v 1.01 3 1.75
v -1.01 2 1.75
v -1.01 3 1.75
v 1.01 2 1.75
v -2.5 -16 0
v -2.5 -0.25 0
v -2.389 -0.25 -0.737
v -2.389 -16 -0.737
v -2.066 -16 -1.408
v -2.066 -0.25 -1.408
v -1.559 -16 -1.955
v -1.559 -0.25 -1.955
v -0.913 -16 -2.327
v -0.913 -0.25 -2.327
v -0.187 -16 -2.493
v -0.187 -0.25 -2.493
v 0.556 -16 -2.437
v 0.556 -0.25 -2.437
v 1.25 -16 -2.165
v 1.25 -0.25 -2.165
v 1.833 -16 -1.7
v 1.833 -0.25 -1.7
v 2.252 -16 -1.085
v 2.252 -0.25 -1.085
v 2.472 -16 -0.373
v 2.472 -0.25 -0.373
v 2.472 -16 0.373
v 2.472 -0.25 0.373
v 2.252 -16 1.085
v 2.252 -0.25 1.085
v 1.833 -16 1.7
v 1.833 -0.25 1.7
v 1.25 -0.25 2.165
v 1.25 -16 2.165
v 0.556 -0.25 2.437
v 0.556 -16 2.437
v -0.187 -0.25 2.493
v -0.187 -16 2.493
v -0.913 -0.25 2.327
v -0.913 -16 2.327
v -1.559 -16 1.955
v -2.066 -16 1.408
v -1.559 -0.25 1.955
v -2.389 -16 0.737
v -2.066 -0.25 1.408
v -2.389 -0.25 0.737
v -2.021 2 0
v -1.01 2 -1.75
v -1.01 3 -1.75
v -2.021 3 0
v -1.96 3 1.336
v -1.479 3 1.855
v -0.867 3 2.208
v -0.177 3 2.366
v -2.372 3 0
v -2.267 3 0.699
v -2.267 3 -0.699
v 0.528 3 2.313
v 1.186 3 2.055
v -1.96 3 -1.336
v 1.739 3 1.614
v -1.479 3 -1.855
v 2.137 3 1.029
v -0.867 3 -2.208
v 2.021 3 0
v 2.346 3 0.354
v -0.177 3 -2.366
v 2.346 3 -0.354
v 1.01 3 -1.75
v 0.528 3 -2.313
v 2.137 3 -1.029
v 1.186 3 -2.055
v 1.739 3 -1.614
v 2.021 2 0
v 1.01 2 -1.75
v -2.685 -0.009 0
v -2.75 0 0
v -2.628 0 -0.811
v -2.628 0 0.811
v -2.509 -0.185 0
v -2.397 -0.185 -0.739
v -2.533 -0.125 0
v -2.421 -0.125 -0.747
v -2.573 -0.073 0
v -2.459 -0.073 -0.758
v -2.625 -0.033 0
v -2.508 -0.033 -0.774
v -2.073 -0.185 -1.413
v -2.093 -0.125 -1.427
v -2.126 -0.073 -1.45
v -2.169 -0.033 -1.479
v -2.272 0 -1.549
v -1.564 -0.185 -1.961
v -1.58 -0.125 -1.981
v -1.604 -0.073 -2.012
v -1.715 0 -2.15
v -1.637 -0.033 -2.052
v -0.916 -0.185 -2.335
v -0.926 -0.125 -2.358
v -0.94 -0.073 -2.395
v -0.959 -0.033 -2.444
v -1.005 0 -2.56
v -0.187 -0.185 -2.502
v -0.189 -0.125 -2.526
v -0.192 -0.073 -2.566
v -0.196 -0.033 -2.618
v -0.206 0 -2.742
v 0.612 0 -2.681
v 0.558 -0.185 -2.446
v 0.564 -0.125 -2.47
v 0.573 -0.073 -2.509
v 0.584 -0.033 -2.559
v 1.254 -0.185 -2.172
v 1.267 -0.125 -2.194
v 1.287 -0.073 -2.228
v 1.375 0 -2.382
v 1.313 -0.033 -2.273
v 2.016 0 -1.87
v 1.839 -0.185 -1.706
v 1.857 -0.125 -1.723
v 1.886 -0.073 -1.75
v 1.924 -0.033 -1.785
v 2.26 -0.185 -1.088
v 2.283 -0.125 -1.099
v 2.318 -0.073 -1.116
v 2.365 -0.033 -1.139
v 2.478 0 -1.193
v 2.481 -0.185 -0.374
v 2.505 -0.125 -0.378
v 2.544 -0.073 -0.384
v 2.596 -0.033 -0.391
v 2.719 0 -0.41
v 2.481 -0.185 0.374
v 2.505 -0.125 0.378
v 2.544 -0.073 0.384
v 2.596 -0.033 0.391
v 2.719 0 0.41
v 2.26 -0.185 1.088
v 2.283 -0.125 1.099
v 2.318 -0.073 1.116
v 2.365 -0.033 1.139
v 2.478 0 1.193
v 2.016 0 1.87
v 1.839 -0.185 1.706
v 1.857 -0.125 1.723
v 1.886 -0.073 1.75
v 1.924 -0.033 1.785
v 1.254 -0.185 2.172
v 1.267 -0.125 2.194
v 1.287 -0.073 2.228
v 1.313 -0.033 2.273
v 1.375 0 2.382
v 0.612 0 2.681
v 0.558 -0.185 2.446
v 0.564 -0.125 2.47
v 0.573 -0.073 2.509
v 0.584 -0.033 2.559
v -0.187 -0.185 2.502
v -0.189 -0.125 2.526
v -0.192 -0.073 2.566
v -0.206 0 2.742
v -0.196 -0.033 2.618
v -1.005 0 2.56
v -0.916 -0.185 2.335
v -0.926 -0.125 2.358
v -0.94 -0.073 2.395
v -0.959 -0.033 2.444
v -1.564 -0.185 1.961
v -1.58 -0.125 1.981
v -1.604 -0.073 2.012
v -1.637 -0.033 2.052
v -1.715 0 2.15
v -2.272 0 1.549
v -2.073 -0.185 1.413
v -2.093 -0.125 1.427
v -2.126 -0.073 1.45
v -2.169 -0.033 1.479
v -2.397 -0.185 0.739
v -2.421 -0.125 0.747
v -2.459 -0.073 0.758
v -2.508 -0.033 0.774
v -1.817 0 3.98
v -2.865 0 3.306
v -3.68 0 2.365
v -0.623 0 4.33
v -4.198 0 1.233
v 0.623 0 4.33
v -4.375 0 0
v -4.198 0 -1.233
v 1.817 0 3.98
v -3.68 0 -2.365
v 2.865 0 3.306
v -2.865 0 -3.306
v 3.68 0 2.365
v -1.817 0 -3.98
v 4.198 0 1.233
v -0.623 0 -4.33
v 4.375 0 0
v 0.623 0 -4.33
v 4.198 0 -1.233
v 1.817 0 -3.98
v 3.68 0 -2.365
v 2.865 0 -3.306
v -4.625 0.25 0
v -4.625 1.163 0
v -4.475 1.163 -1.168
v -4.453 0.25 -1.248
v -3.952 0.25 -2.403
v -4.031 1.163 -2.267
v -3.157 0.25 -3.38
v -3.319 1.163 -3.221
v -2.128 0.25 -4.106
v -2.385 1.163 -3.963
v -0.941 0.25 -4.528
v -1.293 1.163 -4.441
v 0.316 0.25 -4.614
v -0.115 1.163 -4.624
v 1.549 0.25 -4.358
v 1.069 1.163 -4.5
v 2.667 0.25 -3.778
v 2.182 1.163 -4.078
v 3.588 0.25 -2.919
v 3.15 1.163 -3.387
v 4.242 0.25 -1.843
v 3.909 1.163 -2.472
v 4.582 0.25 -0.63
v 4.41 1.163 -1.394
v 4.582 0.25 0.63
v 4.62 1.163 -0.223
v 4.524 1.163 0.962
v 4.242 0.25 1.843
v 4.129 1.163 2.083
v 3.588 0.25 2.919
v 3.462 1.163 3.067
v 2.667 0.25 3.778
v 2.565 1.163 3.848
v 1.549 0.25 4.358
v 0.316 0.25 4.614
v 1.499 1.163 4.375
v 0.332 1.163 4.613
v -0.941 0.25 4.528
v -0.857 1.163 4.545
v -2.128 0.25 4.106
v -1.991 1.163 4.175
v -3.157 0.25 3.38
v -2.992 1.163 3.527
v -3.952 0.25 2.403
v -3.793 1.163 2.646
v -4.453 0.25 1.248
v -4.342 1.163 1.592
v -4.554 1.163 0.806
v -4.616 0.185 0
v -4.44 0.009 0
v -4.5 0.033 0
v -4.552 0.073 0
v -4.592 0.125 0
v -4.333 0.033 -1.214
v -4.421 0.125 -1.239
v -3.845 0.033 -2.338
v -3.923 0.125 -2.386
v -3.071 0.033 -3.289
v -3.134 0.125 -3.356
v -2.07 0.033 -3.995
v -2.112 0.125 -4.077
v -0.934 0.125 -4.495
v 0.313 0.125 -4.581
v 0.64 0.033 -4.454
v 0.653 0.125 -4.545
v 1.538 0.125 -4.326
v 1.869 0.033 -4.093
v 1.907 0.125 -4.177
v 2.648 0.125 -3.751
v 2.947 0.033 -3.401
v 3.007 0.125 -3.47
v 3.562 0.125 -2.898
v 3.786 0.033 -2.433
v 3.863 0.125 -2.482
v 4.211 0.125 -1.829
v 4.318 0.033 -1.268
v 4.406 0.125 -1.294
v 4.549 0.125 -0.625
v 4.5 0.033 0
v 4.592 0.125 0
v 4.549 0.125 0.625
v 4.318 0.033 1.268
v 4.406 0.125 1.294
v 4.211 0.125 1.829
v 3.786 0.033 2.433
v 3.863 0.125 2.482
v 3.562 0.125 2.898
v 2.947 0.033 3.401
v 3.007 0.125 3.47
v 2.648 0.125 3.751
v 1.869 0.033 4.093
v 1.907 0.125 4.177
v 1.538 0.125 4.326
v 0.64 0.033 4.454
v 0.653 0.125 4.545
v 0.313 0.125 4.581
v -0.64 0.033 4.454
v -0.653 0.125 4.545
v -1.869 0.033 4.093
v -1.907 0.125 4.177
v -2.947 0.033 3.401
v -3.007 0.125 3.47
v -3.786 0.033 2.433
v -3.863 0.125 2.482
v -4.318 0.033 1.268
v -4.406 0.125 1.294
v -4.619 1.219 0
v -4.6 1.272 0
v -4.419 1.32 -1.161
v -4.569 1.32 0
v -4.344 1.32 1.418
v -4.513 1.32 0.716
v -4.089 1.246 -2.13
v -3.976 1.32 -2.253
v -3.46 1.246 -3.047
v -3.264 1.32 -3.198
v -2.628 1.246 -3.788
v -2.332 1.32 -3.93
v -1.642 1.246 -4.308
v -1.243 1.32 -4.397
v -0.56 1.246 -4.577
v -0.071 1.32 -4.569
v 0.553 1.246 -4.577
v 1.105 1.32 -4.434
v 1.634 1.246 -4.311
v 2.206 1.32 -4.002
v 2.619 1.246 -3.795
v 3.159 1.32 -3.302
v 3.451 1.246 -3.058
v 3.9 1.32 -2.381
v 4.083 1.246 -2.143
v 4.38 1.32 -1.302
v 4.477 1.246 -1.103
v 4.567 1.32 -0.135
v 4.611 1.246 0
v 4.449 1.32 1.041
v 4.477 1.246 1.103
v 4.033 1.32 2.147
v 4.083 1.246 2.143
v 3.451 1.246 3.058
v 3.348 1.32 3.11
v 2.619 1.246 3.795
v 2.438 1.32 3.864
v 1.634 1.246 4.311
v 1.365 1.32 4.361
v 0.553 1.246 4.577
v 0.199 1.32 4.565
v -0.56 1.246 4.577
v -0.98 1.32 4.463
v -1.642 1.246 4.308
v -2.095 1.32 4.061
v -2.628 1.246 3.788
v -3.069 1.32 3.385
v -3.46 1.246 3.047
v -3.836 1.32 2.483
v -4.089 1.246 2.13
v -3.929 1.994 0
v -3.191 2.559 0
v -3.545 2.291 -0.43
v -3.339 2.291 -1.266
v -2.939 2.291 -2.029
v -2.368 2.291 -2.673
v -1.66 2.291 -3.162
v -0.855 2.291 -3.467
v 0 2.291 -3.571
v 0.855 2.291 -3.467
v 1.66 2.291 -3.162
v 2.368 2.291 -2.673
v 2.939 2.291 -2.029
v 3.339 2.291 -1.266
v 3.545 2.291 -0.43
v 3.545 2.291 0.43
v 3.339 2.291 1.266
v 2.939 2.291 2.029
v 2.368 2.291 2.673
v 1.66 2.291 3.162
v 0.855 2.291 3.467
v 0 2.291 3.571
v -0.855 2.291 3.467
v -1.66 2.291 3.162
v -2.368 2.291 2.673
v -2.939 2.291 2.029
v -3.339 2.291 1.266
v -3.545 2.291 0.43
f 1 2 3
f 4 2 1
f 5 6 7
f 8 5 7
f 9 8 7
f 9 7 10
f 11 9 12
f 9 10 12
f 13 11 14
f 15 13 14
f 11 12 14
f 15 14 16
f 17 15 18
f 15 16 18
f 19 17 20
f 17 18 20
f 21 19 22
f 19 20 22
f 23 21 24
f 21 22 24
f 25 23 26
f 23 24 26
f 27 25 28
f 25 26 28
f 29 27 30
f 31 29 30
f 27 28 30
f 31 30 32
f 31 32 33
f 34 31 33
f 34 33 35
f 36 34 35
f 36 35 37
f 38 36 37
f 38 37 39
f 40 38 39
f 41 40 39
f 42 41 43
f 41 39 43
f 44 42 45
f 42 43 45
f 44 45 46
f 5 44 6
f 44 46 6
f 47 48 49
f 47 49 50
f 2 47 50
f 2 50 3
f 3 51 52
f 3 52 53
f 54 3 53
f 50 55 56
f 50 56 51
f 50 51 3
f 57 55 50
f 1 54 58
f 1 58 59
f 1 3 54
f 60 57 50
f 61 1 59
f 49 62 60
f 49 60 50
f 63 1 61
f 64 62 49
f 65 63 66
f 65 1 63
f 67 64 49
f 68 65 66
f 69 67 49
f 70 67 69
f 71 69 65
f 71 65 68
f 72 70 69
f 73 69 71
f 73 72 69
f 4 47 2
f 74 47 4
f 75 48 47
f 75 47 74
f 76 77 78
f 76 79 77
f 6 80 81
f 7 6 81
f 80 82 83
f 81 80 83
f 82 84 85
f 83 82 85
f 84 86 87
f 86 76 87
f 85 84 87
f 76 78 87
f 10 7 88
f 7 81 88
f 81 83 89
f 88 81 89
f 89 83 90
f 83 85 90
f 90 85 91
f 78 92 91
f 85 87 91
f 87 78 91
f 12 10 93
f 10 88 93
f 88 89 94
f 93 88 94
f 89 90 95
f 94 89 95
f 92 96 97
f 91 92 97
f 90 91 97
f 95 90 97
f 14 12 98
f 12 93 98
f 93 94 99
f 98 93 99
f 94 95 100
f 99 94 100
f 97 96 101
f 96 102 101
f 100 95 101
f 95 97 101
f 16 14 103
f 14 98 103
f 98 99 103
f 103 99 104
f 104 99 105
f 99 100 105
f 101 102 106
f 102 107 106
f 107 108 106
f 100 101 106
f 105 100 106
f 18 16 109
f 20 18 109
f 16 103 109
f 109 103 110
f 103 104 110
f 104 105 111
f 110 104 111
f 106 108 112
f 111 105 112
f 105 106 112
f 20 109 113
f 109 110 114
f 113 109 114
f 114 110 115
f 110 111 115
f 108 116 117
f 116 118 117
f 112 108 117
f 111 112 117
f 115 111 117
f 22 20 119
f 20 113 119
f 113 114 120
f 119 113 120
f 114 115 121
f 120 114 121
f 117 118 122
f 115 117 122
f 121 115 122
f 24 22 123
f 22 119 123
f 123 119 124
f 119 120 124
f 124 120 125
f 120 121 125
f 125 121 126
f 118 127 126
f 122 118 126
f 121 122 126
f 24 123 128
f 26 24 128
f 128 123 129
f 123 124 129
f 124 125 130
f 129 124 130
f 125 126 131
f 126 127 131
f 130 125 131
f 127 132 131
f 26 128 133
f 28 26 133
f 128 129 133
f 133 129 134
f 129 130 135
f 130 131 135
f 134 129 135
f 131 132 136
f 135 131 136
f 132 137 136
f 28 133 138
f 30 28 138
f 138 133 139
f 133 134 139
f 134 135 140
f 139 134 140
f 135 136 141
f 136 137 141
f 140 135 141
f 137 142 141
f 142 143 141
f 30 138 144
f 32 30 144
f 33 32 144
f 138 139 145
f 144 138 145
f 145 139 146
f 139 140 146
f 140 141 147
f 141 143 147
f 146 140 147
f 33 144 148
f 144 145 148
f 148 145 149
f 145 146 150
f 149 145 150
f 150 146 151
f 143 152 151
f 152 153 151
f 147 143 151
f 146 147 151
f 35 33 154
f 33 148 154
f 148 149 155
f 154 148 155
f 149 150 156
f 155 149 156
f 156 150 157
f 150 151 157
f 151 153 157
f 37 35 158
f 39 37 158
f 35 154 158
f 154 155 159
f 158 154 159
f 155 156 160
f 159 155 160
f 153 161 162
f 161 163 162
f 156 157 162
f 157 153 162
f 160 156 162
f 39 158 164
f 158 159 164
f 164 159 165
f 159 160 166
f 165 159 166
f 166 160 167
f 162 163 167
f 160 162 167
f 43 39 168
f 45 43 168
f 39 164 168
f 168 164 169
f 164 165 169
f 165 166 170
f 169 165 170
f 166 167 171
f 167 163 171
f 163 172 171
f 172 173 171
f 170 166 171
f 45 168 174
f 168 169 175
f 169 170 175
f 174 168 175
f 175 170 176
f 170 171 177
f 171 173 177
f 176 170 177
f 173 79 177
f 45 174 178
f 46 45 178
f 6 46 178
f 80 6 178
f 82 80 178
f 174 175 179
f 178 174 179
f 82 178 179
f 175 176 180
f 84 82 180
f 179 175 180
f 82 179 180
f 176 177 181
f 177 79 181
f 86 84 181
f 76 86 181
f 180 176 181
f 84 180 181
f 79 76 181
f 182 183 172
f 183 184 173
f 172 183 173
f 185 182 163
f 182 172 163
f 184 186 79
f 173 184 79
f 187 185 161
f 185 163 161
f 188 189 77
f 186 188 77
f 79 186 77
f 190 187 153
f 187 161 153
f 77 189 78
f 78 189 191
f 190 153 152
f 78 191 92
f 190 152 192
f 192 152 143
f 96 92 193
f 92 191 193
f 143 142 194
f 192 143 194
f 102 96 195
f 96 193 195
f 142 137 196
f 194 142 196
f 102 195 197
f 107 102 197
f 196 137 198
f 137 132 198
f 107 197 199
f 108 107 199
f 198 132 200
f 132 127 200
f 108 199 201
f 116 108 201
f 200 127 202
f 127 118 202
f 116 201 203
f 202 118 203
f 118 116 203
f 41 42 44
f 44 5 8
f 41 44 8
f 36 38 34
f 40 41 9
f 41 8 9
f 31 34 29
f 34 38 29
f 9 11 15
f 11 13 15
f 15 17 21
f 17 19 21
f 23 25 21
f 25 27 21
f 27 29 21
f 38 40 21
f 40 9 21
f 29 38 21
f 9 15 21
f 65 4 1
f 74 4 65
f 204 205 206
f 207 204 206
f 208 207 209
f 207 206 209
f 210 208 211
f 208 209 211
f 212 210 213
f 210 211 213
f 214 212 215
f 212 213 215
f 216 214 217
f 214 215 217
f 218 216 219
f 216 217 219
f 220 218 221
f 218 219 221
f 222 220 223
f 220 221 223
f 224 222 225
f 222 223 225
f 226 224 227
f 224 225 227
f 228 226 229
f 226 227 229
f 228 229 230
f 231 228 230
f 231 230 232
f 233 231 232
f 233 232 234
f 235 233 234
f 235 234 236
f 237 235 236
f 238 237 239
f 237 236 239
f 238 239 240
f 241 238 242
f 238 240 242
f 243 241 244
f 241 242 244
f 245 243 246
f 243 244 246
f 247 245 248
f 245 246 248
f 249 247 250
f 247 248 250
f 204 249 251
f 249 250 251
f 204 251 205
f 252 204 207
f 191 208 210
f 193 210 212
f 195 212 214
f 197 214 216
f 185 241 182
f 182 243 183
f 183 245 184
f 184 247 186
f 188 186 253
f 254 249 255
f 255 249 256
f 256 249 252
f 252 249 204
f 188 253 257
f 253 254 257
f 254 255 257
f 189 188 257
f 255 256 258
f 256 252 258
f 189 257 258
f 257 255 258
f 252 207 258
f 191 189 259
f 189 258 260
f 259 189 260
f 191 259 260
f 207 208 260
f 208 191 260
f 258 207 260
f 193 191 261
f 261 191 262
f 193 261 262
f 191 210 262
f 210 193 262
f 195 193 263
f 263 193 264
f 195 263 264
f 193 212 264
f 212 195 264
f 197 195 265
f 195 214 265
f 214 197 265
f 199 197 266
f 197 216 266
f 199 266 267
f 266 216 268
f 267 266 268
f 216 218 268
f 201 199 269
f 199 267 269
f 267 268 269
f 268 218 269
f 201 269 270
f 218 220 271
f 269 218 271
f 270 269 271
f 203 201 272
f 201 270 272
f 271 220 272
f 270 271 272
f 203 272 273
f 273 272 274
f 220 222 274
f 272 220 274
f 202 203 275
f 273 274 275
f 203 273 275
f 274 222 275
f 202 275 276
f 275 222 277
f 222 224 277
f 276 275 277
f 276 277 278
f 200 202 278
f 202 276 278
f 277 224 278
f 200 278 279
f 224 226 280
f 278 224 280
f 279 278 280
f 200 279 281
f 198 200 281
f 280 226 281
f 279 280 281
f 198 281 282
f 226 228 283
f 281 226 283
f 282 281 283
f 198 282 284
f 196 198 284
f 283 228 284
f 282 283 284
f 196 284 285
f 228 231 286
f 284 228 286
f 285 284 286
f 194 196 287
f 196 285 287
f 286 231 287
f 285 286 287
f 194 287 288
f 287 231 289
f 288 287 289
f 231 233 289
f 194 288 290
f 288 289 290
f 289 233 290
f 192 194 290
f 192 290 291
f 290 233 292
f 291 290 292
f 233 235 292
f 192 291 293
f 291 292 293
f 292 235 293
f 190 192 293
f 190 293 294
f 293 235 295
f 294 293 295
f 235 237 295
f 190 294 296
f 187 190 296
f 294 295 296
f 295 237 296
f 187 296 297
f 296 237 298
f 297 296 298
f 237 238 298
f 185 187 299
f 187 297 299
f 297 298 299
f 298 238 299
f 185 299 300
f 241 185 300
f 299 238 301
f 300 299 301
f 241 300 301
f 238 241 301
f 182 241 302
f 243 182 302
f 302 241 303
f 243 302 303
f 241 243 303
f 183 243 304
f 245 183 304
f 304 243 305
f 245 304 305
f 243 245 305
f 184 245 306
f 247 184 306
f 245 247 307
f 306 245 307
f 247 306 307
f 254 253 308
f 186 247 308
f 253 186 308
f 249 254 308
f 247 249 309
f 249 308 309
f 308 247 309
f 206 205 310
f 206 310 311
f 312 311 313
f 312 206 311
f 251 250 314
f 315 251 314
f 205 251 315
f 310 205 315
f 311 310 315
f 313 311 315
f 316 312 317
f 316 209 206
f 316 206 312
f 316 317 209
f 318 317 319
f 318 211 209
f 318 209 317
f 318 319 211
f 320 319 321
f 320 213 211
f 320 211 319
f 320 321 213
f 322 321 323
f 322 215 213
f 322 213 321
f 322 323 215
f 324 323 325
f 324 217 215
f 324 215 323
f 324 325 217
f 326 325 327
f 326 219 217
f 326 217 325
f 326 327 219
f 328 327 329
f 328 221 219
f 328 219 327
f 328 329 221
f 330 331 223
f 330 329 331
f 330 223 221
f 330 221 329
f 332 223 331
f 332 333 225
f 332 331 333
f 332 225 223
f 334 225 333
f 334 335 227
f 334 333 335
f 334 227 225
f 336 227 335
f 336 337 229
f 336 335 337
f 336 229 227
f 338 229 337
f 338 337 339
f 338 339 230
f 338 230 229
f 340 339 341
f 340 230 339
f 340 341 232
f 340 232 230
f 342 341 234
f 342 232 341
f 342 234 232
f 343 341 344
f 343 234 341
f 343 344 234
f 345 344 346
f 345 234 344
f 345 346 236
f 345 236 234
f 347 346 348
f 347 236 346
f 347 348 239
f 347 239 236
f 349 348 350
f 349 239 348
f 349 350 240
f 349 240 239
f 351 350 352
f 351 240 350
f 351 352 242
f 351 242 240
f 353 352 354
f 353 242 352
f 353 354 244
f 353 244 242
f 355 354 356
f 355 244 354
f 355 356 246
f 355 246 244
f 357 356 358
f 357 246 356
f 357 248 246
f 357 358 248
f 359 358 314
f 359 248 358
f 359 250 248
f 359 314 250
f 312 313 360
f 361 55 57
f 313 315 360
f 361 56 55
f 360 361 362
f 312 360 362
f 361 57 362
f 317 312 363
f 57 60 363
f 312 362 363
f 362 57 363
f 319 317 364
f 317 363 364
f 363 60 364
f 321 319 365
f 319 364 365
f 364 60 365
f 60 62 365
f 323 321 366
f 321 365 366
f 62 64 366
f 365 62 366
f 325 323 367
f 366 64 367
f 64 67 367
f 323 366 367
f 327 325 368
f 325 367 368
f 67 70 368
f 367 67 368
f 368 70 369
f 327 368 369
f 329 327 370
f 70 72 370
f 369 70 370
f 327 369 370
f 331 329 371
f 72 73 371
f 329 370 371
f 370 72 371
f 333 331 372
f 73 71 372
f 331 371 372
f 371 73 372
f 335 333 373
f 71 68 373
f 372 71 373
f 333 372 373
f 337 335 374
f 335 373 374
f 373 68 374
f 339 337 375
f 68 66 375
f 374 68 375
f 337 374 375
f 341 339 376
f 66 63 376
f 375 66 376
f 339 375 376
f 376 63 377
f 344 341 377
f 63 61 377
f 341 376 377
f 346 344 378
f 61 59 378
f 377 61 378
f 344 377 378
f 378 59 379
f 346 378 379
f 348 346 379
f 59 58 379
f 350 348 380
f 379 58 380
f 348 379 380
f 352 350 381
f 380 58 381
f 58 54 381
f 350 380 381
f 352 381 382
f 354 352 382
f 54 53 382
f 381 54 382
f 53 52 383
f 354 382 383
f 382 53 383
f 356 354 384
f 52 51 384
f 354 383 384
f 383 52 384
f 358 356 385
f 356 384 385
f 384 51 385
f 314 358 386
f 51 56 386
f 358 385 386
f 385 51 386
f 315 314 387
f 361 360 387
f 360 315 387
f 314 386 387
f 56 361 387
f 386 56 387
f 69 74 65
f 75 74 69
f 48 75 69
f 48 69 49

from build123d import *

# Parameters (mm, degrees)
CUT_EXTRUDE1_START      = 2
CUT_EXTRUDE1_DEPTH      = 3
FILLET1_R               = 0.25
CUT_EXTRUDE2_DEPTH      = 18.285290042
CUT_EXTRUDE2_DEPTH_BACK = 18.285290042
SKETCH4_W               = 9.25
SKETCH4_H               = 2


with BuildPart() as part:
    # Sketch2 → Revolve1 (revolve)
    with BuildSketch(Plane.XY, mode=Mode.PRIVATE) as revolve1_sk:
        with BuildLine():
            Line((2.5, -16), (2.5, -7.698851501))
            ThreePointArc((2.5, -7.698851501), (1.280768103, -8.115724939), (0, -8.256944444))
            Line((0, -8.256944444), (0, -16))
            Line((0, -16), (2.5, -16))
        make_face()
        with BuildLine():
            Line((2.5, 0), (4.625, 0))
            Line((4.625, 0), (4.625, 1.25))
            ThreePointArc((4.625, 1.25), (2.571630076, 2.907656268), (0, 3.5))
            Line((0, 3.5), (0, -8.256944444))
            ThreePointArc((0, -8.256944444), (1.280768103, -8.115724939), (2.5, -7.698851501))
            Line((2.5, -7.698851501), (2.5, 0))
        make_face()
    revolve(revolve1_sk.sketch.rotate(Axis((0, 21.322324325, 0), (0, -1, 0)), 180), axis=Axis((0, 21.322324325, 0), (0, -1, 0)))

    # Sketch3 → Cut-Extrude1 (cut)
    with BuildSketch(Plane(origin=(0, 0, 0), x_dir=(1, 0, 0), z_dir=(0, 1, 0)).offset(CUT_EXTRUDE1_START)):
        Polygon((2.020725942, 0), (1.010362971, 1.75), (-1.010362971, 1.75), (-2.020725942, 0), (-1.010362971, -1.75), (1.010362971, -1.75), align=None)
    extrude(amount=CUT_EXTRUDE1_DEPTH, mode=Mode.SUBTRACT)

    # Fillet1
    fillet1_edges = [part.edges().sort_by_distance(p)[0] for p in [
        (4.625, 1.25, 0),
        (4.625, 0, 0),
        (2.5, 0, 0),
    ]]
    fillet(fillet1_edges, radius=FILLET1_R)

    # Sketch4 → Cut-Extrude2 (cut, two sides: drawn at the far end of the back side and taken through both)
    with BuildSketch(Plane.XY.offset(-CUT_EXTRUDE2_DEPTH_BACK)):
        with Locations((0, 4)):
            Rectangle(SKETCH4_W, SKETCH4_H)
    extrude(amount=CUT_EXTRUDE2_DEPTH + CUT_EXTRUDE2_DEPTH_BACK, mode=Mode.SUBTRACT)


solid = part.part
